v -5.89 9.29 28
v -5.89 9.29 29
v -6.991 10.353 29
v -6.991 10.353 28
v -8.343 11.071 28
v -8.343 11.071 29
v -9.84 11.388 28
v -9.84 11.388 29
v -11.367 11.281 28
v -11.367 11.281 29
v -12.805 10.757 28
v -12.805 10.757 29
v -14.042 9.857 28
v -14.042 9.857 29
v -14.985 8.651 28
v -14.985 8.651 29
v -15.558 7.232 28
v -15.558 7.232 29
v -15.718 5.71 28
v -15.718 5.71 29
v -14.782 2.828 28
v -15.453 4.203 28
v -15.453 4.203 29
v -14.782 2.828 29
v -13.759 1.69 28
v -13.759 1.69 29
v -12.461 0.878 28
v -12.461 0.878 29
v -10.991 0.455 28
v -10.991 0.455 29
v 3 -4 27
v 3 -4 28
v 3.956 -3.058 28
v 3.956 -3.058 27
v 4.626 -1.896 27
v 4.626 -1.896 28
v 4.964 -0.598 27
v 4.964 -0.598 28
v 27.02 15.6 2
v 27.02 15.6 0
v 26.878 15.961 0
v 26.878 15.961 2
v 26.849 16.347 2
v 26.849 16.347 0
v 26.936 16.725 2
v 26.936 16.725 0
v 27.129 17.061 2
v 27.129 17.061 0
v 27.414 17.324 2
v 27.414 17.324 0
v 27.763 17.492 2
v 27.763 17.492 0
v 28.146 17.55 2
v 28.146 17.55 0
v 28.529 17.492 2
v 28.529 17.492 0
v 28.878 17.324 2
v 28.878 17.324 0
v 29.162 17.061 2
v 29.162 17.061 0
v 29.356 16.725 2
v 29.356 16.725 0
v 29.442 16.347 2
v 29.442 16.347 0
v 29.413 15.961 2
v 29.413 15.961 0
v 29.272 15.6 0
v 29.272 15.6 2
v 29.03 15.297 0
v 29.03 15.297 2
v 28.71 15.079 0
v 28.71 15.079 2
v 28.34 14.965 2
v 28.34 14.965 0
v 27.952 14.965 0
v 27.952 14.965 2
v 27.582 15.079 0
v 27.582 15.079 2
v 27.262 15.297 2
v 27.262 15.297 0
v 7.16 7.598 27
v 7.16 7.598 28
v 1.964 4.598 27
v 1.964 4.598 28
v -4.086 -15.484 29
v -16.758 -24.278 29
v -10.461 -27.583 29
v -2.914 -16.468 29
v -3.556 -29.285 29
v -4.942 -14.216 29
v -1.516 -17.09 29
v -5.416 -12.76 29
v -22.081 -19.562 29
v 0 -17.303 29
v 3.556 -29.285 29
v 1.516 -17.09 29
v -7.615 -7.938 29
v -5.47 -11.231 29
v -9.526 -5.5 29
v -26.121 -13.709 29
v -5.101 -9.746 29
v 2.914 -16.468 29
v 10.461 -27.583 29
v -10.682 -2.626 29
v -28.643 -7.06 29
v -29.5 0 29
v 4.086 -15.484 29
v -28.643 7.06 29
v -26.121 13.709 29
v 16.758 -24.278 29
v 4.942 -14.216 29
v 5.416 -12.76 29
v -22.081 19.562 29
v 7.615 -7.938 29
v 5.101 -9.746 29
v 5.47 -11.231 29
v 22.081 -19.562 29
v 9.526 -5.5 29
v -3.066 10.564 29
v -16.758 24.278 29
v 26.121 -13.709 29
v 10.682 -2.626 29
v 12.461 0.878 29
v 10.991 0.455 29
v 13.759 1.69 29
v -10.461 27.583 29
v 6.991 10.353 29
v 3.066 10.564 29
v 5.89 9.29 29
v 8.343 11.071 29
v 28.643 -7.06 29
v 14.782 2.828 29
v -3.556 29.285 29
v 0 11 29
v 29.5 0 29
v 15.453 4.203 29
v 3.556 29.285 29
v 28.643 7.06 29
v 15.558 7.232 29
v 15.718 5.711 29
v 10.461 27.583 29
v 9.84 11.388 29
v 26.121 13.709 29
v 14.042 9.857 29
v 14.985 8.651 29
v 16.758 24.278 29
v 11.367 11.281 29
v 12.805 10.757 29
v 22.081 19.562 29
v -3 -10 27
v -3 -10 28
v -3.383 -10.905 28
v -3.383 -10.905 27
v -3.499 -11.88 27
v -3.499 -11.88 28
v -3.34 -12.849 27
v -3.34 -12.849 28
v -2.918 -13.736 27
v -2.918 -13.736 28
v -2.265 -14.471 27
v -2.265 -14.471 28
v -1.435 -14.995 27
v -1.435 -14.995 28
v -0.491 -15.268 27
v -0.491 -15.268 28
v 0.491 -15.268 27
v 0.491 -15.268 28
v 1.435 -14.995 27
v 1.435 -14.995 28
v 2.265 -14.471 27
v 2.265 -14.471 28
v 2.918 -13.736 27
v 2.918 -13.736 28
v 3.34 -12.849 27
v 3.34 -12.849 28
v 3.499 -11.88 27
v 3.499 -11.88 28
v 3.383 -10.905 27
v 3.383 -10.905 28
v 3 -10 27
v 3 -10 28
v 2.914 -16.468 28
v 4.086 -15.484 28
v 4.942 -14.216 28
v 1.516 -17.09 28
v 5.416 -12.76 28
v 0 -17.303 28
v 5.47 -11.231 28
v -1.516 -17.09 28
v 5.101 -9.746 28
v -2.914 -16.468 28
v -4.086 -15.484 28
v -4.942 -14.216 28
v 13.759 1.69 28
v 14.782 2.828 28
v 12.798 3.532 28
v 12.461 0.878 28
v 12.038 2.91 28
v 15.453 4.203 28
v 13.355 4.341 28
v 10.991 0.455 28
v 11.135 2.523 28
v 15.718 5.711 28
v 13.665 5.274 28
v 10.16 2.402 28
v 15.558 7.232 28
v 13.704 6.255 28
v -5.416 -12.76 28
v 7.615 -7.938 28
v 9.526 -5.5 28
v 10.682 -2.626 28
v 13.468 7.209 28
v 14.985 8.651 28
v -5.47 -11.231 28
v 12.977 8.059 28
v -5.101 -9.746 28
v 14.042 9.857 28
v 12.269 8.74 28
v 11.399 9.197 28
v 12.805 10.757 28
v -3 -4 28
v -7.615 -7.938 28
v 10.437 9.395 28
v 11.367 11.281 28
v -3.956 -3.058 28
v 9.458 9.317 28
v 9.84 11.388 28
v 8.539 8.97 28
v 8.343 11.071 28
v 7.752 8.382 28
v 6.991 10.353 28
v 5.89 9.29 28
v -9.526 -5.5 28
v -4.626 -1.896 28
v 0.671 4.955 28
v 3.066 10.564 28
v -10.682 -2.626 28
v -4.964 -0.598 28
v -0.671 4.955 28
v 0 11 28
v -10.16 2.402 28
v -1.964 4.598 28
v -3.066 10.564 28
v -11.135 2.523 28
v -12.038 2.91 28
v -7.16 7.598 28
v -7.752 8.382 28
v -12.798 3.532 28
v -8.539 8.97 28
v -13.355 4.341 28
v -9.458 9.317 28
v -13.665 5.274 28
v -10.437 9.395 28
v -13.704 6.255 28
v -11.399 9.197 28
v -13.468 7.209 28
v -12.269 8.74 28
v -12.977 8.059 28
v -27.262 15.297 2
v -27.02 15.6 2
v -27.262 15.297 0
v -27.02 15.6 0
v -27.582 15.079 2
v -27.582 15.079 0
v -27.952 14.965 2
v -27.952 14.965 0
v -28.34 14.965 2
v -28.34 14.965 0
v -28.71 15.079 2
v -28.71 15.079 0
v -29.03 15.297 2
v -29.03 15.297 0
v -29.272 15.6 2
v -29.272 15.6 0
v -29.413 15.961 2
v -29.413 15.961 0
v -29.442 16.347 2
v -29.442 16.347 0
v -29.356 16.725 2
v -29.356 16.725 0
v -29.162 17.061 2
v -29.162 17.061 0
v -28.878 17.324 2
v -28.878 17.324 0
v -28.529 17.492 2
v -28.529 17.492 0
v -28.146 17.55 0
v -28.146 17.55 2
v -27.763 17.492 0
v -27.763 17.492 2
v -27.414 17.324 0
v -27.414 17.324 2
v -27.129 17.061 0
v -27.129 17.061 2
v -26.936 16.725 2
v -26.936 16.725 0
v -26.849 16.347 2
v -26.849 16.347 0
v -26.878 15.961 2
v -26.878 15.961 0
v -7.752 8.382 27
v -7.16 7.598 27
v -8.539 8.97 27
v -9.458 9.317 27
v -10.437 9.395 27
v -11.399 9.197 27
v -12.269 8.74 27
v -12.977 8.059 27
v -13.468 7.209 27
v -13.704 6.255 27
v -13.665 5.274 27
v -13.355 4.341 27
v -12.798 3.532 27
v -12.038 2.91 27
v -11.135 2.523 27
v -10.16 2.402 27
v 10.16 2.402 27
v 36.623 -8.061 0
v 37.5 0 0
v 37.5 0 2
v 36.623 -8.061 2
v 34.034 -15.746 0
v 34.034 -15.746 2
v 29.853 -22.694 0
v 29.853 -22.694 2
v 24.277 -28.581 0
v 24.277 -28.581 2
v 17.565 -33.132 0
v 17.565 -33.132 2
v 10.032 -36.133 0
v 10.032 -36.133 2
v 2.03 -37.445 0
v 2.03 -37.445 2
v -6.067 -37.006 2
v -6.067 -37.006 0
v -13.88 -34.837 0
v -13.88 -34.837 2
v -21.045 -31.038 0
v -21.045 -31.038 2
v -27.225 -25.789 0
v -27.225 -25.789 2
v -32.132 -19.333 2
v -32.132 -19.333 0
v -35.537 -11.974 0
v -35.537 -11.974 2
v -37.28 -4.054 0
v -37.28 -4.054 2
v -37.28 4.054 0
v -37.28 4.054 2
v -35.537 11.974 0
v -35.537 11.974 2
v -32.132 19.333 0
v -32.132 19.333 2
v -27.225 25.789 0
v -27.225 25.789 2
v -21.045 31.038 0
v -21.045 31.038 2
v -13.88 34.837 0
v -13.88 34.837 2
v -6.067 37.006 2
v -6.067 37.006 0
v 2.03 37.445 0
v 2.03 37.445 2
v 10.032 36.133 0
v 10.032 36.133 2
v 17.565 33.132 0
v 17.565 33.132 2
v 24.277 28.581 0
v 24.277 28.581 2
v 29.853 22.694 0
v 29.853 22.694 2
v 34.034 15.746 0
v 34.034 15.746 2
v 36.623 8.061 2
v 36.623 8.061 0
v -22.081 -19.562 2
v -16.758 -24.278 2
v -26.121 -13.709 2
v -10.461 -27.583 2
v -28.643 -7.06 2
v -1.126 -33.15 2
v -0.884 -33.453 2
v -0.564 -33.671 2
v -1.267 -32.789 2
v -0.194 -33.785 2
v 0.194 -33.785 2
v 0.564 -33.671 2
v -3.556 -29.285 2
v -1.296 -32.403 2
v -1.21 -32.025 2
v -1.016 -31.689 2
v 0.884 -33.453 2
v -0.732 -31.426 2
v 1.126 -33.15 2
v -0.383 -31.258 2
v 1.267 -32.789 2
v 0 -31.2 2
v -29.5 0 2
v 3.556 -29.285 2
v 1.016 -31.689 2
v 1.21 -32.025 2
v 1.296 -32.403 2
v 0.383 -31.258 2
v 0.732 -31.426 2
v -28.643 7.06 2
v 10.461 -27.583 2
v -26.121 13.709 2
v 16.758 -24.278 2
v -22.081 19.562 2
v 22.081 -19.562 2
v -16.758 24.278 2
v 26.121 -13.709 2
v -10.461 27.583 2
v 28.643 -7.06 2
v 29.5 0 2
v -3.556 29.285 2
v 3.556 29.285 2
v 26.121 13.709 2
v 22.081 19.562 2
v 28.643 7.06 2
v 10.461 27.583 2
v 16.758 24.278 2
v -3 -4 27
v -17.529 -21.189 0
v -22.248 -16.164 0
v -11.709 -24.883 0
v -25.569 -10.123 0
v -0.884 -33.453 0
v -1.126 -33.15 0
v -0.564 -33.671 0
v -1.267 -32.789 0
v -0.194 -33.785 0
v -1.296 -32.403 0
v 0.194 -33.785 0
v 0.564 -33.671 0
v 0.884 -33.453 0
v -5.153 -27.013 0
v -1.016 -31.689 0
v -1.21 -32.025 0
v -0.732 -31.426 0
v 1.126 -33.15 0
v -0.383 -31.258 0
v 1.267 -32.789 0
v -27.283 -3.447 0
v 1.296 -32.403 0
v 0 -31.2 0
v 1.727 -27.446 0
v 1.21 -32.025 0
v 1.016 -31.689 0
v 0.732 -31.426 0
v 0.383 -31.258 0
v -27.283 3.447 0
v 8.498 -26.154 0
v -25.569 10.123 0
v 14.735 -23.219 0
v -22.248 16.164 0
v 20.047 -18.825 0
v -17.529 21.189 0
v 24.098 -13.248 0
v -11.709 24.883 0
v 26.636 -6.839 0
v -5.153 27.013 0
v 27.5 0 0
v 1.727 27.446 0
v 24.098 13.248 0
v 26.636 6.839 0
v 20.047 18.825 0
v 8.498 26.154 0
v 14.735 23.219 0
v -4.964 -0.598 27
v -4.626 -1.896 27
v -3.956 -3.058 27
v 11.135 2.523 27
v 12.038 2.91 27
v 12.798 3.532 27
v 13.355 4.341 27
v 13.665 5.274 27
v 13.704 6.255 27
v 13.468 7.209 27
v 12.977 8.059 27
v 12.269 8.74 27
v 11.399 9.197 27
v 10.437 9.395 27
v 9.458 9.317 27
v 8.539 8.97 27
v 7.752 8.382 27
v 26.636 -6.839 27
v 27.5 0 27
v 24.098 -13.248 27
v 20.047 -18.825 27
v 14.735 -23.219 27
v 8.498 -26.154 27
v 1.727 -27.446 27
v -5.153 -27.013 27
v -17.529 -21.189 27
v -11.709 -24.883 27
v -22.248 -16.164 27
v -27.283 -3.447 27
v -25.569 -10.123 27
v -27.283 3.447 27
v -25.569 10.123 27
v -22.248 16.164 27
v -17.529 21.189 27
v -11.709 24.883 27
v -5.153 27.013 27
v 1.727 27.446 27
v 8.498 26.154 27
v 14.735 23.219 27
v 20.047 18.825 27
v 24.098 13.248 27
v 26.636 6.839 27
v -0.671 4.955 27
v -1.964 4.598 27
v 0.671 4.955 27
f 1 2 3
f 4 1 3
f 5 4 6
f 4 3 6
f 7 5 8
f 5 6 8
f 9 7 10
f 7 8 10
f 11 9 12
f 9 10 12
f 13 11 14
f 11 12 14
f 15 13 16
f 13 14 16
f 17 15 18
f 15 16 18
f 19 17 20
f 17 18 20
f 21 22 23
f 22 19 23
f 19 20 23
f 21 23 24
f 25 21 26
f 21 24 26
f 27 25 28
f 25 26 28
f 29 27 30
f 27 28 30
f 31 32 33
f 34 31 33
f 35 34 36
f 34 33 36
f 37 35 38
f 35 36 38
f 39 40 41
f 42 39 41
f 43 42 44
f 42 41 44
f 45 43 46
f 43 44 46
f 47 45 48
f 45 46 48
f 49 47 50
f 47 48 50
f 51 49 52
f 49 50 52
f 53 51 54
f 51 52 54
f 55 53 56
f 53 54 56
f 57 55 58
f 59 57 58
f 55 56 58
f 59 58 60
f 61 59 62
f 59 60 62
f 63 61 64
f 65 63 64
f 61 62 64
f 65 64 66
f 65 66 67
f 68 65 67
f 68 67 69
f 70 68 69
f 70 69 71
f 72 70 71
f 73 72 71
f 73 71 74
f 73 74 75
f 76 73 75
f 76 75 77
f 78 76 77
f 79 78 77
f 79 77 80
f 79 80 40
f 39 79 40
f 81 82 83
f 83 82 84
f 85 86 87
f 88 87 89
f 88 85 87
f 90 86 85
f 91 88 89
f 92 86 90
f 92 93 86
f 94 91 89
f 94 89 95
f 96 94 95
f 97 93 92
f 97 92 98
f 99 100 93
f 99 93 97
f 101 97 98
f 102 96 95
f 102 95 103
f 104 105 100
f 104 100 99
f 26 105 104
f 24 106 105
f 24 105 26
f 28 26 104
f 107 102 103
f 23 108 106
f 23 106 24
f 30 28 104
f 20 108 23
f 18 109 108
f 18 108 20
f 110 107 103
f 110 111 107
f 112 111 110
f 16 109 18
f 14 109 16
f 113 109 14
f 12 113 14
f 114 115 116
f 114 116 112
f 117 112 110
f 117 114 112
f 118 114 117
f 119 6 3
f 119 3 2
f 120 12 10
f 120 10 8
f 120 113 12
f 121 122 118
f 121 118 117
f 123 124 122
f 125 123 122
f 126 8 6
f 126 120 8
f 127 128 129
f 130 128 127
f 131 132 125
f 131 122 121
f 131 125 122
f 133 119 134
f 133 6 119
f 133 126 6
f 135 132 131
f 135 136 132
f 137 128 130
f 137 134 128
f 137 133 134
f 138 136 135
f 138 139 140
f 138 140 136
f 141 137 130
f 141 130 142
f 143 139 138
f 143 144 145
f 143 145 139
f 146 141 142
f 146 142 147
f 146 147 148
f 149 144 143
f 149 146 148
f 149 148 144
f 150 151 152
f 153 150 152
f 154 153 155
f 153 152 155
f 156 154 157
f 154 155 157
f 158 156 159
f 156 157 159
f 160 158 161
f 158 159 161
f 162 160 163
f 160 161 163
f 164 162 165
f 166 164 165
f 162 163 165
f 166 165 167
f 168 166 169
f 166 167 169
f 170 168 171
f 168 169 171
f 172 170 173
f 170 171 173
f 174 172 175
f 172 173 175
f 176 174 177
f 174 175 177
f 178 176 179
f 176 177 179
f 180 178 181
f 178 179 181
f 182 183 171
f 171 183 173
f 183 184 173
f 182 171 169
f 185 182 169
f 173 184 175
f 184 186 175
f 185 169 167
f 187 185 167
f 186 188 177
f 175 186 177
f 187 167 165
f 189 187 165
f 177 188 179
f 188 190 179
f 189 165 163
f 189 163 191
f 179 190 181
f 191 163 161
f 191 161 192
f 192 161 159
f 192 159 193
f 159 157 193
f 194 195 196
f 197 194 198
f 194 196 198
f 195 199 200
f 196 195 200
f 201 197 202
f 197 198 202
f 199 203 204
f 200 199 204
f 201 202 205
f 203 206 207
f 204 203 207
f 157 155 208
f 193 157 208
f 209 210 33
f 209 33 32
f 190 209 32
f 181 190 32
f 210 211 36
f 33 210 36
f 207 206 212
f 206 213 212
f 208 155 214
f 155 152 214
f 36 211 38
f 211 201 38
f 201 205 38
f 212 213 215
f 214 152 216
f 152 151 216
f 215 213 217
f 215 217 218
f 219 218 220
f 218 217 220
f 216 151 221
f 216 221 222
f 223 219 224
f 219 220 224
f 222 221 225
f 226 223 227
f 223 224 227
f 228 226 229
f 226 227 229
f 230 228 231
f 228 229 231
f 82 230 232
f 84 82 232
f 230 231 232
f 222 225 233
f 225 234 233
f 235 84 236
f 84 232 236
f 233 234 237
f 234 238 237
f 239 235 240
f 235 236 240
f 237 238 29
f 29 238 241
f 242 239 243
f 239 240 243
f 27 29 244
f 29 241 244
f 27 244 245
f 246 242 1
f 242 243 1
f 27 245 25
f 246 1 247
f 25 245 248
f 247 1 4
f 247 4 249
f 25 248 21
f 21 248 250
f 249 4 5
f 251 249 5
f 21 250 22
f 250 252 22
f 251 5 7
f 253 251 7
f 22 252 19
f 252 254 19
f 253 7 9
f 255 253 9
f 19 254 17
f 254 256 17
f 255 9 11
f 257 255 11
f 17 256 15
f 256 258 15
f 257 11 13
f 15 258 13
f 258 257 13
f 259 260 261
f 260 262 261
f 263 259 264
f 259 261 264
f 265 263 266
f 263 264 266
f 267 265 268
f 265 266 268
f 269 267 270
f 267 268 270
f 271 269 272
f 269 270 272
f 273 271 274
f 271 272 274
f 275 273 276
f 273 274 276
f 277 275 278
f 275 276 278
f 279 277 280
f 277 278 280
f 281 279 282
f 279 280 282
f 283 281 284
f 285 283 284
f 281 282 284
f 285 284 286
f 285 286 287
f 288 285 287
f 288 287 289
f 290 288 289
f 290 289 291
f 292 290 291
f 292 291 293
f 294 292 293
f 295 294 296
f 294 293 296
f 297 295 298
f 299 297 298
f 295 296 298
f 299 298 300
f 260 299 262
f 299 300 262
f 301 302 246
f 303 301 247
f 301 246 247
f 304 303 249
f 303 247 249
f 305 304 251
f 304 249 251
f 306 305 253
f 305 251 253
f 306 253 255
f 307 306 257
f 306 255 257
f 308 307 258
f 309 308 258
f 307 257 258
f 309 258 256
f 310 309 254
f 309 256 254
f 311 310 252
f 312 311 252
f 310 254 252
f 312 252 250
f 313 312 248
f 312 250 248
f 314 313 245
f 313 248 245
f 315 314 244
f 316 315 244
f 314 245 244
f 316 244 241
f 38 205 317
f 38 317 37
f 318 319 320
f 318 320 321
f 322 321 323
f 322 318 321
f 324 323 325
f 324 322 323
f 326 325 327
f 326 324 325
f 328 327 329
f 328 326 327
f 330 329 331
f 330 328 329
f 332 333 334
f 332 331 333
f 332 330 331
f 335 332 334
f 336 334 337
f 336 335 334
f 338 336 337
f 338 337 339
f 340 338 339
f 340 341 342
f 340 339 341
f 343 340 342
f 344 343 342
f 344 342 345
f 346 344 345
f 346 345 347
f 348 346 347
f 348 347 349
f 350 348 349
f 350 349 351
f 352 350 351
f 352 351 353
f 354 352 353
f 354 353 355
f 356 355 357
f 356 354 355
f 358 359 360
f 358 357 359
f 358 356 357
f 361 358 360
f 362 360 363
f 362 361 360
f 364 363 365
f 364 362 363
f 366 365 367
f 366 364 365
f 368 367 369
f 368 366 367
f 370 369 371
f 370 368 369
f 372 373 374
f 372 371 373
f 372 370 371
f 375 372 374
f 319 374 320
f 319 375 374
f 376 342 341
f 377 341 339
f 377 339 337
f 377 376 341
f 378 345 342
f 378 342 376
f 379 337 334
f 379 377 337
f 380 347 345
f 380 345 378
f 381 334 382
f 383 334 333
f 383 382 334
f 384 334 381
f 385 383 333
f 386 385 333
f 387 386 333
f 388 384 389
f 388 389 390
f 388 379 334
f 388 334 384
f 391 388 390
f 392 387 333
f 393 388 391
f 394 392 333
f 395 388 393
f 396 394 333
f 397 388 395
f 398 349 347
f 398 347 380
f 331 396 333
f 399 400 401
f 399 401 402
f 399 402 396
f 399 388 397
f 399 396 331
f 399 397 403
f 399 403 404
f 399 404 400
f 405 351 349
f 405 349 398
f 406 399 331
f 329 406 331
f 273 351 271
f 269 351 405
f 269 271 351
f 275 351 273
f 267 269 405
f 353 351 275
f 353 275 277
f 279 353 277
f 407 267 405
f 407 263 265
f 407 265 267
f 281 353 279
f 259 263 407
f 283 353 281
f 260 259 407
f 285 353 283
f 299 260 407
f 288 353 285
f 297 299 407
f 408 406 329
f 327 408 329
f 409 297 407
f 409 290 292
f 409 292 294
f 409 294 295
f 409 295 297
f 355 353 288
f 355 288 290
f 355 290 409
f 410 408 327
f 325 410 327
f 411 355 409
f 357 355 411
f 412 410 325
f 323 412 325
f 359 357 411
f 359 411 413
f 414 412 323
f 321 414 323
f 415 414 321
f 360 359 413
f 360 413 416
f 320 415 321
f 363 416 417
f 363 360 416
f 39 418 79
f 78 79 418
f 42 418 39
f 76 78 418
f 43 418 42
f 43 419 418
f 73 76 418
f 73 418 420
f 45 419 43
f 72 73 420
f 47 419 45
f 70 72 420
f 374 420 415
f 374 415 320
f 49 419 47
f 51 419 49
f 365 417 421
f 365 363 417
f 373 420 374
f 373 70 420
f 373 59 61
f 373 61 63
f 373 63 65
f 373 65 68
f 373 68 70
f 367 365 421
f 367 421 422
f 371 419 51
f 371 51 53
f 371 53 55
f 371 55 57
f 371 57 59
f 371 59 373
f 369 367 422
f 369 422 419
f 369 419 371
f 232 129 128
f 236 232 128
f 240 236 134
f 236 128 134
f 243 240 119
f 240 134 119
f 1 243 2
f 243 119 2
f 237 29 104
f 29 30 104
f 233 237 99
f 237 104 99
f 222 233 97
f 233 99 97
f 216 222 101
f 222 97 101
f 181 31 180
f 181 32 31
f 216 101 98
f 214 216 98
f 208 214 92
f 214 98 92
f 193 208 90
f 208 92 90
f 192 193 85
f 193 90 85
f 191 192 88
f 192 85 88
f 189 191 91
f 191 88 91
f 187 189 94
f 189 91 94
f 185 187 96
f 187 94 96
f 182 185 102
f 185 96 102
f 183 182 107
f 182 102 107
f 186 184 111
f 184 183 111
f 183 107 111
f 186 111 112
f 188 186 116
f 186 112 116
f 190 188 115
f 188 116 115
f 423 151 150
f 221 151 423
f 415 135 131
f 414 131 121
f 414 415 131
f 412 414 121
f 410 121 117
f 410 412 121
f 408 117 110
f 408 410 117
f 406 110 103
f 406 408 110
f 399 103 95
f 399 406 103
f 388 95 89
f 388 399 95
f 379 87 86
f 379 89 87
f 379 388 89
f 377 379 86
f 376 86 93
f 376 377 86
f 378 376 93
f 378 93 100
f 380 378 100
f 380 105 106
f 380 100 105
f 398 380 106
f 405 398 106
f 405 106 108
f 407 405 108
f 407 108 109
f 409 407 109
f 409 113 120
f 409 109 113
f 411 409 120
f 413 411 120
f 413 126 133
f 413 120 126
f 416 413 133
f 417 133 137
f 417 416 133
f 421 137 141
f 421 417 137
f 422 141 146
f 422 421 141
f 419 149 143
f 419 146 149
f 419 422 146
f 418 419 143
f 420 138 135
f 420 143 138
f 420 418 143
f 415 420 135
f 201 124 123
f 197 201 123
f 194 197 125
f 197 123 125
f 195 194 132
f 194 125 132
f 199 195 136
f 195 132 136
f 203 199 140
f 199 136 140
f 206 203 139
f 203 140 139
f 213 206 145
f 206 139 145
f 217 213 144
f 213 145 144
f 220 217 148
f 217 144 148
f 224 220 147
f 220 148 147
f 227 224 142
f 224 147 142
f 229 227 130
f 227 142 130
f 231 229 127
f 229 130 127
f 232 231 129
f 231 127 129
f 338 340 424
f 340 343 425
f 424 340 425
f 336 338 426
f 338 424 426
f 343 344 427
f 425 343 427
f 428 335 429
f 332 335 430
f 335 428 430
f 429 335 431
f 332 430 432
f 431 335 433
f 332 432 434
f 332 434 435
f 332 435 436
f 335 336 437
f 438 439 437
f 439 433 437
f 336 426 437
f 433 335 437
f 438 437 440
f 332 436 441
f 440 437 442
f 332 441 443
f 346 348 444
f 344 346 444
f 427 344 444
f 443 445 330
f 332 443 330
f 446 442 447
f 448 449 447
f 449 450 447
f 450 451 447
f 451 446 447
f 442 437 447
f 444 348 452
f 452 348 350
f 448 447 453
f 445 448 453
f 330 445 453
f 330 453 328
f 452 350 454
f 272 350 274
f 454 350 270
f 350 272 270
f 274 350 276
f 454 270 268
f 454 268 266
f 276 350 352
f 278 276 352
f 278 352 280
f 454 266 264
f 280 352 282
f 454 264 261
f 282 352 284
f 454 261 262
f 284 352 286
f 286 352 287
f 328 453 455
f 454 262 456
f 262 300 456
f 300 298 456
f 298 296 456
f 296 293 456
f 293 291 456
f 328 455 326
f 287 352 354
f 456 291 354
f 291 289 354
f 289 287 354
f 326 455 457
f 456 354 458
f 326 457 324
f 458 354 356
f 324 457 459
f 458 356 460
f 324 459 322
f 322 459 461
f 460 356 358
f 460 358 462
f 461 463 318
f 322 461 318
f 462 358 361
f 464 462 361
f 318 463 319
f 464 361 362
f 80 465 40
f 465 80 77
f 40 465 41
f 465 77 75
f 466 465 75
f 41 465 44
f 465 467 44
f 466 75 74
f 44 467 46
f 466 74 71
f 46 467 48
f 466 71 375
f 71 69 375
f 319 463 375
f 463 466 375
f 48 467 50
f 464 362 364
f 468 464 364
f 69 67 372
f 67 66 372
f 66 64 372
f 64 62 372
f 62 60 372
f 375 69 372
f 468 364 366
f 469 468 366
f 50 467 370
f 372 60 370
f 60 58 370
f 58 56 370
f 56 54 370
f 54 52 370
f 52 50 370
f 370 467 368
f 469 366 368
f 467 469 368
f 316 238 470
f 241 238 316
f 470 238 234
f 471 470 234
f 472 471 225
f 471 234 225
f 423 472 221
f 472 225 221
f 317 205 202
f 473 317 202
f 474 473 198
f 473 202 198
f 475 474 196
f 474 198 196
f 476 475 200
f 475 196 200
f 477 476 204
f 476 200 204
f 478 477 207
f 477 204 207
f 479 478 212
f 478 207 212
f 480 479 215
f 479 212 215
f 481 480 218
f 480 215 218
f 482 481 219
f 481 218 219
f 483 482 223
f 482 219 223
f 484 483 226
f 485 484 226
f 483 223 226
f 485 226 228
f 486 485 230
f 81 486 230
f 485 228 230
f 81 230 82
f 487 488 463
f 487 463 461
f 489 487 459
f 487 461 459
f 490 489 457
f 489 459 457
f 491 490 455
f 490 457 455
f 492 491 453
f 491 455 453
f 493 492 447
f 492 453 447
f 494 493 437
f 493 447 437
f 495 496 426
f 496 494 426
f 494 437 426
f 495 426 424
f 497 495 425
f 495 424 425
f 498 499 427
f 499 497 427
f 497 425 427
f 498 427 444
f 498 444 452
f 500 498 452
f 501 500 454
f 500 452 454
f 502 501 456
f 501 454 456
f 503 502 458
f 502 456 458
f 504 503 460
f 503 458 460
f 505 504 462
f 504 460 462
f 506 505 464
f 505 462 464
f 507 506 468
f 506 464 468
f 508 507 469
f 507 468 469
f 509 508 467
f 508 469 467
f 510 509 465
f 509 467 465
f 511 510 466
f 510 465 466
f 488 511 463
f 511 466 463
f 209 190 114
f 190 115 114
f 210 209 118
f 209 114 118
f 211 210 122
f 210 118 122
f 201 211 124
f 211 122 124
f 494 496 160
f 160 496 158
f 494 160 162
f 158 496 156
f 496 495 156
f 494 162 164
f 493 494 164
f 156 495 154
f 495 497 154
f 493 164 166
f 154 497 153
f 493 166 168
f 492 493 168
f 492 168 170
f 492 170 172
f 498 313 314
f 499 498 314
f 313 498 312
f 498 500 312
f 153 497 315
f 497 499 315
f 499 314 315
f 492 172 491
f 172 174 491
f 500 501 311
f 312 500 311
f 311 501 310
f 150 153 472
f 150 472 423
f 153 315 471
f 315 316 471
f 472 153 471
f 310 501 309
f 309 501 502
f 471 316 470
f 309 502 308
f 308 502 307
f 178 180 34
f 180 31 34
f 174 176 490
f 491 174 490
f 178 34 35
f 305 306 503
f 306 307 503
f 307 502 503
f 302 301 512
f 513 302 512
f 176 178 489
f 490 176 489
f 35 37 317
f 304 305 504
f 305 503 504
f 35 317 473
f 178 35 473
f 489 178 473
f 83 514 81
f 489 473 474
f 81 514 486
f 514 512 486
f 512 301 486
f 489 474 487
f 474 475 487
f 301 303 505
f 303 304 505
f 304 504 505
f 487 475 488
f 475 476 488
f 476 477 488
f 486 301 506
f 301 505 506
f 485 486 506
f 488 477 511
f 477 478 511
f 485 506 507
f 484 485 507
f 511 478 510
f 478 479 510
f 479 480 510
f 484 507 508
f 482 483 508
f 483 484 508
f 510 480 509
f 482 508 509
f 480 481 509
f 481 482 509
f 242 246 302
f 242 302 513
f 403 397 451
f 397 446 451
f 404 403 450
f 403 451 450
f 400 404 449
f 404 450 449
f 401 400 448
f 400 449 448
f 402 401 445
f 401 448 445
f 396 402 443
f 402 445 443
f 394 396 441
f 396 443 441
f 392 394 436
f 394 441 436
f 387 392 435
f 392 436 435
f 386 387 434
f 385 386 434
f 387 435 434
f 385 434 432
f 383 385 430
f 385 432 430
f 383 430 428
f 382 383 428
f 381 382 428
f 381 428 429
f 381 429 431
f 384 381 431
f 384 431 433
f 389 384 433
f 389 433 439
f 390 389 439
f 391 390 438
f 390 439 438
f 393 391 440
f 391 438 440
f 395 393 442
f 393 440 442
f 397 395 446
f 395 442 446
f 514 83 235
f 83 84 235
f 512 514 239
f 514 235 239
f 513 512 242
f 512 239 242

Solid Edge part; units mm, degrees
sketch "Sketch1" plane through (0, 0, 0) normal (0, 0, 1) x (1, 0, 0)
  circle A0 centre (0, 0) radius 37.5
  circle A1 centre (0, 0) radius 27.5
extrude "Protrusion1" add sketch "Sketch1" along normal blind 2
sketch "Sketch2" plane through (0, 0, 2) normal (0, 0, 1) x (1, 0, 0)
  circle A0 centre (0, 0) radius 27.5
  circle A1 centre (0, 0) radius 29.5
extrude "Cup" add sketch "Sketch2" along normal blind 27
sketch "Sketch3" plane through (0, 0, 29) normal (0, 0, 1) x (1, 0, 0)
  circle A0 centre (0, 0) radius 27.5
extrude "End" add sketch "Sketch3" against normal blind 2
hole "Attachment___Edge" at (0, -32.5, 0) direction (0, 0, 1) diameter 2.6 end up to next
pattern_circular "Pattern1" count 3 over 360 about axis through (0, 0, 0) along (0, 0, 1) of "Attachment___Edge"
sketch "Sketch4" plane through (0, 0, 29) normal (0, 0, 1) x (-1, 0, 0)
  line L0 (-10.1603, -2.4019) -> (-4.9641, 0.5981)
  line L1 (-3, 4) -> (-3, 10)
  line L2 (3, 10) -> (3, 4)
  arc A0 (3, 4) -> (4.9641, 0.5981) centre (0, 0) cw
  line L3 (4.9641, 0.5981) -> (10.1603, -2.4019)
  line L4 (7.1603, -7.5981) -> (1.9641, -4.5981)
  arc A1 (1.9641, -4.5981) -> (-1.9641, -4.5981) centre (0, 0) cw
  line L5 (-7.1603, -7.5981) -> (-1.9641, -4.5981)
  arc A2 (10.1603, -2.4019) -> (7.1603, -7.5981) centre (10.2215, -5.9014) cw
  arc A3 (-3, 10) -> (3, 10) centre (0, 11.8028) cw
  arc A4 (-4.9641, 0.5981) -> (-3, 4) centre (0, 0) cw
  arc A5 (-7.1603, -7.5981) -> (-10.1603, -2.4019) centre (-10.2215, -5.9014) cw
  dimension "D1" = 7
  dimension "D2" = 7
  dimension "D3" = 10
  dimension "D4" = 7
  dimension "D5" = 6
  dimension "D6" = 6
  dimension "D7" = 6
  dimension "D8" = 6
  dimension "D9" = 11.8028
extrude "Cutout1" cut sketch "Sketch4" against normal up to next
sketch "Sketch5" plane through (0, 0, 29) normal (0, 0, 1) x (-1, 0, 0)
  arc A0 (-5.1009, 9.7458) -> (5.1009, 9.7458) centre (0, 11.8028) cw
  arc A1 (5.1009, 9.7458) -> (10.9906, -0.4554) centre (0, 0) cw
  arc A2 (10.9906, -0.4554) -> (5.8897, -9.2904) centre (10.2215, -5.9014) cw
  arc A3 (-5.8897, -9.2904) -> (-10.9906, -0.4554) centre (-10.2215, -5.9014) cw
  arc A4 (-10.9906, -0.4554) -> (-5.1009, 9.7458) centre (0, 0) cw
  arc A5 (5.8897, -9.2904) -> (-5.8897, -9.2904) centre (0, 0) cw
extrude "Cutout_distance___End" cut sketch "Sketch5" against normal blind 1
properties material "ABS Plastic, medium impact"
